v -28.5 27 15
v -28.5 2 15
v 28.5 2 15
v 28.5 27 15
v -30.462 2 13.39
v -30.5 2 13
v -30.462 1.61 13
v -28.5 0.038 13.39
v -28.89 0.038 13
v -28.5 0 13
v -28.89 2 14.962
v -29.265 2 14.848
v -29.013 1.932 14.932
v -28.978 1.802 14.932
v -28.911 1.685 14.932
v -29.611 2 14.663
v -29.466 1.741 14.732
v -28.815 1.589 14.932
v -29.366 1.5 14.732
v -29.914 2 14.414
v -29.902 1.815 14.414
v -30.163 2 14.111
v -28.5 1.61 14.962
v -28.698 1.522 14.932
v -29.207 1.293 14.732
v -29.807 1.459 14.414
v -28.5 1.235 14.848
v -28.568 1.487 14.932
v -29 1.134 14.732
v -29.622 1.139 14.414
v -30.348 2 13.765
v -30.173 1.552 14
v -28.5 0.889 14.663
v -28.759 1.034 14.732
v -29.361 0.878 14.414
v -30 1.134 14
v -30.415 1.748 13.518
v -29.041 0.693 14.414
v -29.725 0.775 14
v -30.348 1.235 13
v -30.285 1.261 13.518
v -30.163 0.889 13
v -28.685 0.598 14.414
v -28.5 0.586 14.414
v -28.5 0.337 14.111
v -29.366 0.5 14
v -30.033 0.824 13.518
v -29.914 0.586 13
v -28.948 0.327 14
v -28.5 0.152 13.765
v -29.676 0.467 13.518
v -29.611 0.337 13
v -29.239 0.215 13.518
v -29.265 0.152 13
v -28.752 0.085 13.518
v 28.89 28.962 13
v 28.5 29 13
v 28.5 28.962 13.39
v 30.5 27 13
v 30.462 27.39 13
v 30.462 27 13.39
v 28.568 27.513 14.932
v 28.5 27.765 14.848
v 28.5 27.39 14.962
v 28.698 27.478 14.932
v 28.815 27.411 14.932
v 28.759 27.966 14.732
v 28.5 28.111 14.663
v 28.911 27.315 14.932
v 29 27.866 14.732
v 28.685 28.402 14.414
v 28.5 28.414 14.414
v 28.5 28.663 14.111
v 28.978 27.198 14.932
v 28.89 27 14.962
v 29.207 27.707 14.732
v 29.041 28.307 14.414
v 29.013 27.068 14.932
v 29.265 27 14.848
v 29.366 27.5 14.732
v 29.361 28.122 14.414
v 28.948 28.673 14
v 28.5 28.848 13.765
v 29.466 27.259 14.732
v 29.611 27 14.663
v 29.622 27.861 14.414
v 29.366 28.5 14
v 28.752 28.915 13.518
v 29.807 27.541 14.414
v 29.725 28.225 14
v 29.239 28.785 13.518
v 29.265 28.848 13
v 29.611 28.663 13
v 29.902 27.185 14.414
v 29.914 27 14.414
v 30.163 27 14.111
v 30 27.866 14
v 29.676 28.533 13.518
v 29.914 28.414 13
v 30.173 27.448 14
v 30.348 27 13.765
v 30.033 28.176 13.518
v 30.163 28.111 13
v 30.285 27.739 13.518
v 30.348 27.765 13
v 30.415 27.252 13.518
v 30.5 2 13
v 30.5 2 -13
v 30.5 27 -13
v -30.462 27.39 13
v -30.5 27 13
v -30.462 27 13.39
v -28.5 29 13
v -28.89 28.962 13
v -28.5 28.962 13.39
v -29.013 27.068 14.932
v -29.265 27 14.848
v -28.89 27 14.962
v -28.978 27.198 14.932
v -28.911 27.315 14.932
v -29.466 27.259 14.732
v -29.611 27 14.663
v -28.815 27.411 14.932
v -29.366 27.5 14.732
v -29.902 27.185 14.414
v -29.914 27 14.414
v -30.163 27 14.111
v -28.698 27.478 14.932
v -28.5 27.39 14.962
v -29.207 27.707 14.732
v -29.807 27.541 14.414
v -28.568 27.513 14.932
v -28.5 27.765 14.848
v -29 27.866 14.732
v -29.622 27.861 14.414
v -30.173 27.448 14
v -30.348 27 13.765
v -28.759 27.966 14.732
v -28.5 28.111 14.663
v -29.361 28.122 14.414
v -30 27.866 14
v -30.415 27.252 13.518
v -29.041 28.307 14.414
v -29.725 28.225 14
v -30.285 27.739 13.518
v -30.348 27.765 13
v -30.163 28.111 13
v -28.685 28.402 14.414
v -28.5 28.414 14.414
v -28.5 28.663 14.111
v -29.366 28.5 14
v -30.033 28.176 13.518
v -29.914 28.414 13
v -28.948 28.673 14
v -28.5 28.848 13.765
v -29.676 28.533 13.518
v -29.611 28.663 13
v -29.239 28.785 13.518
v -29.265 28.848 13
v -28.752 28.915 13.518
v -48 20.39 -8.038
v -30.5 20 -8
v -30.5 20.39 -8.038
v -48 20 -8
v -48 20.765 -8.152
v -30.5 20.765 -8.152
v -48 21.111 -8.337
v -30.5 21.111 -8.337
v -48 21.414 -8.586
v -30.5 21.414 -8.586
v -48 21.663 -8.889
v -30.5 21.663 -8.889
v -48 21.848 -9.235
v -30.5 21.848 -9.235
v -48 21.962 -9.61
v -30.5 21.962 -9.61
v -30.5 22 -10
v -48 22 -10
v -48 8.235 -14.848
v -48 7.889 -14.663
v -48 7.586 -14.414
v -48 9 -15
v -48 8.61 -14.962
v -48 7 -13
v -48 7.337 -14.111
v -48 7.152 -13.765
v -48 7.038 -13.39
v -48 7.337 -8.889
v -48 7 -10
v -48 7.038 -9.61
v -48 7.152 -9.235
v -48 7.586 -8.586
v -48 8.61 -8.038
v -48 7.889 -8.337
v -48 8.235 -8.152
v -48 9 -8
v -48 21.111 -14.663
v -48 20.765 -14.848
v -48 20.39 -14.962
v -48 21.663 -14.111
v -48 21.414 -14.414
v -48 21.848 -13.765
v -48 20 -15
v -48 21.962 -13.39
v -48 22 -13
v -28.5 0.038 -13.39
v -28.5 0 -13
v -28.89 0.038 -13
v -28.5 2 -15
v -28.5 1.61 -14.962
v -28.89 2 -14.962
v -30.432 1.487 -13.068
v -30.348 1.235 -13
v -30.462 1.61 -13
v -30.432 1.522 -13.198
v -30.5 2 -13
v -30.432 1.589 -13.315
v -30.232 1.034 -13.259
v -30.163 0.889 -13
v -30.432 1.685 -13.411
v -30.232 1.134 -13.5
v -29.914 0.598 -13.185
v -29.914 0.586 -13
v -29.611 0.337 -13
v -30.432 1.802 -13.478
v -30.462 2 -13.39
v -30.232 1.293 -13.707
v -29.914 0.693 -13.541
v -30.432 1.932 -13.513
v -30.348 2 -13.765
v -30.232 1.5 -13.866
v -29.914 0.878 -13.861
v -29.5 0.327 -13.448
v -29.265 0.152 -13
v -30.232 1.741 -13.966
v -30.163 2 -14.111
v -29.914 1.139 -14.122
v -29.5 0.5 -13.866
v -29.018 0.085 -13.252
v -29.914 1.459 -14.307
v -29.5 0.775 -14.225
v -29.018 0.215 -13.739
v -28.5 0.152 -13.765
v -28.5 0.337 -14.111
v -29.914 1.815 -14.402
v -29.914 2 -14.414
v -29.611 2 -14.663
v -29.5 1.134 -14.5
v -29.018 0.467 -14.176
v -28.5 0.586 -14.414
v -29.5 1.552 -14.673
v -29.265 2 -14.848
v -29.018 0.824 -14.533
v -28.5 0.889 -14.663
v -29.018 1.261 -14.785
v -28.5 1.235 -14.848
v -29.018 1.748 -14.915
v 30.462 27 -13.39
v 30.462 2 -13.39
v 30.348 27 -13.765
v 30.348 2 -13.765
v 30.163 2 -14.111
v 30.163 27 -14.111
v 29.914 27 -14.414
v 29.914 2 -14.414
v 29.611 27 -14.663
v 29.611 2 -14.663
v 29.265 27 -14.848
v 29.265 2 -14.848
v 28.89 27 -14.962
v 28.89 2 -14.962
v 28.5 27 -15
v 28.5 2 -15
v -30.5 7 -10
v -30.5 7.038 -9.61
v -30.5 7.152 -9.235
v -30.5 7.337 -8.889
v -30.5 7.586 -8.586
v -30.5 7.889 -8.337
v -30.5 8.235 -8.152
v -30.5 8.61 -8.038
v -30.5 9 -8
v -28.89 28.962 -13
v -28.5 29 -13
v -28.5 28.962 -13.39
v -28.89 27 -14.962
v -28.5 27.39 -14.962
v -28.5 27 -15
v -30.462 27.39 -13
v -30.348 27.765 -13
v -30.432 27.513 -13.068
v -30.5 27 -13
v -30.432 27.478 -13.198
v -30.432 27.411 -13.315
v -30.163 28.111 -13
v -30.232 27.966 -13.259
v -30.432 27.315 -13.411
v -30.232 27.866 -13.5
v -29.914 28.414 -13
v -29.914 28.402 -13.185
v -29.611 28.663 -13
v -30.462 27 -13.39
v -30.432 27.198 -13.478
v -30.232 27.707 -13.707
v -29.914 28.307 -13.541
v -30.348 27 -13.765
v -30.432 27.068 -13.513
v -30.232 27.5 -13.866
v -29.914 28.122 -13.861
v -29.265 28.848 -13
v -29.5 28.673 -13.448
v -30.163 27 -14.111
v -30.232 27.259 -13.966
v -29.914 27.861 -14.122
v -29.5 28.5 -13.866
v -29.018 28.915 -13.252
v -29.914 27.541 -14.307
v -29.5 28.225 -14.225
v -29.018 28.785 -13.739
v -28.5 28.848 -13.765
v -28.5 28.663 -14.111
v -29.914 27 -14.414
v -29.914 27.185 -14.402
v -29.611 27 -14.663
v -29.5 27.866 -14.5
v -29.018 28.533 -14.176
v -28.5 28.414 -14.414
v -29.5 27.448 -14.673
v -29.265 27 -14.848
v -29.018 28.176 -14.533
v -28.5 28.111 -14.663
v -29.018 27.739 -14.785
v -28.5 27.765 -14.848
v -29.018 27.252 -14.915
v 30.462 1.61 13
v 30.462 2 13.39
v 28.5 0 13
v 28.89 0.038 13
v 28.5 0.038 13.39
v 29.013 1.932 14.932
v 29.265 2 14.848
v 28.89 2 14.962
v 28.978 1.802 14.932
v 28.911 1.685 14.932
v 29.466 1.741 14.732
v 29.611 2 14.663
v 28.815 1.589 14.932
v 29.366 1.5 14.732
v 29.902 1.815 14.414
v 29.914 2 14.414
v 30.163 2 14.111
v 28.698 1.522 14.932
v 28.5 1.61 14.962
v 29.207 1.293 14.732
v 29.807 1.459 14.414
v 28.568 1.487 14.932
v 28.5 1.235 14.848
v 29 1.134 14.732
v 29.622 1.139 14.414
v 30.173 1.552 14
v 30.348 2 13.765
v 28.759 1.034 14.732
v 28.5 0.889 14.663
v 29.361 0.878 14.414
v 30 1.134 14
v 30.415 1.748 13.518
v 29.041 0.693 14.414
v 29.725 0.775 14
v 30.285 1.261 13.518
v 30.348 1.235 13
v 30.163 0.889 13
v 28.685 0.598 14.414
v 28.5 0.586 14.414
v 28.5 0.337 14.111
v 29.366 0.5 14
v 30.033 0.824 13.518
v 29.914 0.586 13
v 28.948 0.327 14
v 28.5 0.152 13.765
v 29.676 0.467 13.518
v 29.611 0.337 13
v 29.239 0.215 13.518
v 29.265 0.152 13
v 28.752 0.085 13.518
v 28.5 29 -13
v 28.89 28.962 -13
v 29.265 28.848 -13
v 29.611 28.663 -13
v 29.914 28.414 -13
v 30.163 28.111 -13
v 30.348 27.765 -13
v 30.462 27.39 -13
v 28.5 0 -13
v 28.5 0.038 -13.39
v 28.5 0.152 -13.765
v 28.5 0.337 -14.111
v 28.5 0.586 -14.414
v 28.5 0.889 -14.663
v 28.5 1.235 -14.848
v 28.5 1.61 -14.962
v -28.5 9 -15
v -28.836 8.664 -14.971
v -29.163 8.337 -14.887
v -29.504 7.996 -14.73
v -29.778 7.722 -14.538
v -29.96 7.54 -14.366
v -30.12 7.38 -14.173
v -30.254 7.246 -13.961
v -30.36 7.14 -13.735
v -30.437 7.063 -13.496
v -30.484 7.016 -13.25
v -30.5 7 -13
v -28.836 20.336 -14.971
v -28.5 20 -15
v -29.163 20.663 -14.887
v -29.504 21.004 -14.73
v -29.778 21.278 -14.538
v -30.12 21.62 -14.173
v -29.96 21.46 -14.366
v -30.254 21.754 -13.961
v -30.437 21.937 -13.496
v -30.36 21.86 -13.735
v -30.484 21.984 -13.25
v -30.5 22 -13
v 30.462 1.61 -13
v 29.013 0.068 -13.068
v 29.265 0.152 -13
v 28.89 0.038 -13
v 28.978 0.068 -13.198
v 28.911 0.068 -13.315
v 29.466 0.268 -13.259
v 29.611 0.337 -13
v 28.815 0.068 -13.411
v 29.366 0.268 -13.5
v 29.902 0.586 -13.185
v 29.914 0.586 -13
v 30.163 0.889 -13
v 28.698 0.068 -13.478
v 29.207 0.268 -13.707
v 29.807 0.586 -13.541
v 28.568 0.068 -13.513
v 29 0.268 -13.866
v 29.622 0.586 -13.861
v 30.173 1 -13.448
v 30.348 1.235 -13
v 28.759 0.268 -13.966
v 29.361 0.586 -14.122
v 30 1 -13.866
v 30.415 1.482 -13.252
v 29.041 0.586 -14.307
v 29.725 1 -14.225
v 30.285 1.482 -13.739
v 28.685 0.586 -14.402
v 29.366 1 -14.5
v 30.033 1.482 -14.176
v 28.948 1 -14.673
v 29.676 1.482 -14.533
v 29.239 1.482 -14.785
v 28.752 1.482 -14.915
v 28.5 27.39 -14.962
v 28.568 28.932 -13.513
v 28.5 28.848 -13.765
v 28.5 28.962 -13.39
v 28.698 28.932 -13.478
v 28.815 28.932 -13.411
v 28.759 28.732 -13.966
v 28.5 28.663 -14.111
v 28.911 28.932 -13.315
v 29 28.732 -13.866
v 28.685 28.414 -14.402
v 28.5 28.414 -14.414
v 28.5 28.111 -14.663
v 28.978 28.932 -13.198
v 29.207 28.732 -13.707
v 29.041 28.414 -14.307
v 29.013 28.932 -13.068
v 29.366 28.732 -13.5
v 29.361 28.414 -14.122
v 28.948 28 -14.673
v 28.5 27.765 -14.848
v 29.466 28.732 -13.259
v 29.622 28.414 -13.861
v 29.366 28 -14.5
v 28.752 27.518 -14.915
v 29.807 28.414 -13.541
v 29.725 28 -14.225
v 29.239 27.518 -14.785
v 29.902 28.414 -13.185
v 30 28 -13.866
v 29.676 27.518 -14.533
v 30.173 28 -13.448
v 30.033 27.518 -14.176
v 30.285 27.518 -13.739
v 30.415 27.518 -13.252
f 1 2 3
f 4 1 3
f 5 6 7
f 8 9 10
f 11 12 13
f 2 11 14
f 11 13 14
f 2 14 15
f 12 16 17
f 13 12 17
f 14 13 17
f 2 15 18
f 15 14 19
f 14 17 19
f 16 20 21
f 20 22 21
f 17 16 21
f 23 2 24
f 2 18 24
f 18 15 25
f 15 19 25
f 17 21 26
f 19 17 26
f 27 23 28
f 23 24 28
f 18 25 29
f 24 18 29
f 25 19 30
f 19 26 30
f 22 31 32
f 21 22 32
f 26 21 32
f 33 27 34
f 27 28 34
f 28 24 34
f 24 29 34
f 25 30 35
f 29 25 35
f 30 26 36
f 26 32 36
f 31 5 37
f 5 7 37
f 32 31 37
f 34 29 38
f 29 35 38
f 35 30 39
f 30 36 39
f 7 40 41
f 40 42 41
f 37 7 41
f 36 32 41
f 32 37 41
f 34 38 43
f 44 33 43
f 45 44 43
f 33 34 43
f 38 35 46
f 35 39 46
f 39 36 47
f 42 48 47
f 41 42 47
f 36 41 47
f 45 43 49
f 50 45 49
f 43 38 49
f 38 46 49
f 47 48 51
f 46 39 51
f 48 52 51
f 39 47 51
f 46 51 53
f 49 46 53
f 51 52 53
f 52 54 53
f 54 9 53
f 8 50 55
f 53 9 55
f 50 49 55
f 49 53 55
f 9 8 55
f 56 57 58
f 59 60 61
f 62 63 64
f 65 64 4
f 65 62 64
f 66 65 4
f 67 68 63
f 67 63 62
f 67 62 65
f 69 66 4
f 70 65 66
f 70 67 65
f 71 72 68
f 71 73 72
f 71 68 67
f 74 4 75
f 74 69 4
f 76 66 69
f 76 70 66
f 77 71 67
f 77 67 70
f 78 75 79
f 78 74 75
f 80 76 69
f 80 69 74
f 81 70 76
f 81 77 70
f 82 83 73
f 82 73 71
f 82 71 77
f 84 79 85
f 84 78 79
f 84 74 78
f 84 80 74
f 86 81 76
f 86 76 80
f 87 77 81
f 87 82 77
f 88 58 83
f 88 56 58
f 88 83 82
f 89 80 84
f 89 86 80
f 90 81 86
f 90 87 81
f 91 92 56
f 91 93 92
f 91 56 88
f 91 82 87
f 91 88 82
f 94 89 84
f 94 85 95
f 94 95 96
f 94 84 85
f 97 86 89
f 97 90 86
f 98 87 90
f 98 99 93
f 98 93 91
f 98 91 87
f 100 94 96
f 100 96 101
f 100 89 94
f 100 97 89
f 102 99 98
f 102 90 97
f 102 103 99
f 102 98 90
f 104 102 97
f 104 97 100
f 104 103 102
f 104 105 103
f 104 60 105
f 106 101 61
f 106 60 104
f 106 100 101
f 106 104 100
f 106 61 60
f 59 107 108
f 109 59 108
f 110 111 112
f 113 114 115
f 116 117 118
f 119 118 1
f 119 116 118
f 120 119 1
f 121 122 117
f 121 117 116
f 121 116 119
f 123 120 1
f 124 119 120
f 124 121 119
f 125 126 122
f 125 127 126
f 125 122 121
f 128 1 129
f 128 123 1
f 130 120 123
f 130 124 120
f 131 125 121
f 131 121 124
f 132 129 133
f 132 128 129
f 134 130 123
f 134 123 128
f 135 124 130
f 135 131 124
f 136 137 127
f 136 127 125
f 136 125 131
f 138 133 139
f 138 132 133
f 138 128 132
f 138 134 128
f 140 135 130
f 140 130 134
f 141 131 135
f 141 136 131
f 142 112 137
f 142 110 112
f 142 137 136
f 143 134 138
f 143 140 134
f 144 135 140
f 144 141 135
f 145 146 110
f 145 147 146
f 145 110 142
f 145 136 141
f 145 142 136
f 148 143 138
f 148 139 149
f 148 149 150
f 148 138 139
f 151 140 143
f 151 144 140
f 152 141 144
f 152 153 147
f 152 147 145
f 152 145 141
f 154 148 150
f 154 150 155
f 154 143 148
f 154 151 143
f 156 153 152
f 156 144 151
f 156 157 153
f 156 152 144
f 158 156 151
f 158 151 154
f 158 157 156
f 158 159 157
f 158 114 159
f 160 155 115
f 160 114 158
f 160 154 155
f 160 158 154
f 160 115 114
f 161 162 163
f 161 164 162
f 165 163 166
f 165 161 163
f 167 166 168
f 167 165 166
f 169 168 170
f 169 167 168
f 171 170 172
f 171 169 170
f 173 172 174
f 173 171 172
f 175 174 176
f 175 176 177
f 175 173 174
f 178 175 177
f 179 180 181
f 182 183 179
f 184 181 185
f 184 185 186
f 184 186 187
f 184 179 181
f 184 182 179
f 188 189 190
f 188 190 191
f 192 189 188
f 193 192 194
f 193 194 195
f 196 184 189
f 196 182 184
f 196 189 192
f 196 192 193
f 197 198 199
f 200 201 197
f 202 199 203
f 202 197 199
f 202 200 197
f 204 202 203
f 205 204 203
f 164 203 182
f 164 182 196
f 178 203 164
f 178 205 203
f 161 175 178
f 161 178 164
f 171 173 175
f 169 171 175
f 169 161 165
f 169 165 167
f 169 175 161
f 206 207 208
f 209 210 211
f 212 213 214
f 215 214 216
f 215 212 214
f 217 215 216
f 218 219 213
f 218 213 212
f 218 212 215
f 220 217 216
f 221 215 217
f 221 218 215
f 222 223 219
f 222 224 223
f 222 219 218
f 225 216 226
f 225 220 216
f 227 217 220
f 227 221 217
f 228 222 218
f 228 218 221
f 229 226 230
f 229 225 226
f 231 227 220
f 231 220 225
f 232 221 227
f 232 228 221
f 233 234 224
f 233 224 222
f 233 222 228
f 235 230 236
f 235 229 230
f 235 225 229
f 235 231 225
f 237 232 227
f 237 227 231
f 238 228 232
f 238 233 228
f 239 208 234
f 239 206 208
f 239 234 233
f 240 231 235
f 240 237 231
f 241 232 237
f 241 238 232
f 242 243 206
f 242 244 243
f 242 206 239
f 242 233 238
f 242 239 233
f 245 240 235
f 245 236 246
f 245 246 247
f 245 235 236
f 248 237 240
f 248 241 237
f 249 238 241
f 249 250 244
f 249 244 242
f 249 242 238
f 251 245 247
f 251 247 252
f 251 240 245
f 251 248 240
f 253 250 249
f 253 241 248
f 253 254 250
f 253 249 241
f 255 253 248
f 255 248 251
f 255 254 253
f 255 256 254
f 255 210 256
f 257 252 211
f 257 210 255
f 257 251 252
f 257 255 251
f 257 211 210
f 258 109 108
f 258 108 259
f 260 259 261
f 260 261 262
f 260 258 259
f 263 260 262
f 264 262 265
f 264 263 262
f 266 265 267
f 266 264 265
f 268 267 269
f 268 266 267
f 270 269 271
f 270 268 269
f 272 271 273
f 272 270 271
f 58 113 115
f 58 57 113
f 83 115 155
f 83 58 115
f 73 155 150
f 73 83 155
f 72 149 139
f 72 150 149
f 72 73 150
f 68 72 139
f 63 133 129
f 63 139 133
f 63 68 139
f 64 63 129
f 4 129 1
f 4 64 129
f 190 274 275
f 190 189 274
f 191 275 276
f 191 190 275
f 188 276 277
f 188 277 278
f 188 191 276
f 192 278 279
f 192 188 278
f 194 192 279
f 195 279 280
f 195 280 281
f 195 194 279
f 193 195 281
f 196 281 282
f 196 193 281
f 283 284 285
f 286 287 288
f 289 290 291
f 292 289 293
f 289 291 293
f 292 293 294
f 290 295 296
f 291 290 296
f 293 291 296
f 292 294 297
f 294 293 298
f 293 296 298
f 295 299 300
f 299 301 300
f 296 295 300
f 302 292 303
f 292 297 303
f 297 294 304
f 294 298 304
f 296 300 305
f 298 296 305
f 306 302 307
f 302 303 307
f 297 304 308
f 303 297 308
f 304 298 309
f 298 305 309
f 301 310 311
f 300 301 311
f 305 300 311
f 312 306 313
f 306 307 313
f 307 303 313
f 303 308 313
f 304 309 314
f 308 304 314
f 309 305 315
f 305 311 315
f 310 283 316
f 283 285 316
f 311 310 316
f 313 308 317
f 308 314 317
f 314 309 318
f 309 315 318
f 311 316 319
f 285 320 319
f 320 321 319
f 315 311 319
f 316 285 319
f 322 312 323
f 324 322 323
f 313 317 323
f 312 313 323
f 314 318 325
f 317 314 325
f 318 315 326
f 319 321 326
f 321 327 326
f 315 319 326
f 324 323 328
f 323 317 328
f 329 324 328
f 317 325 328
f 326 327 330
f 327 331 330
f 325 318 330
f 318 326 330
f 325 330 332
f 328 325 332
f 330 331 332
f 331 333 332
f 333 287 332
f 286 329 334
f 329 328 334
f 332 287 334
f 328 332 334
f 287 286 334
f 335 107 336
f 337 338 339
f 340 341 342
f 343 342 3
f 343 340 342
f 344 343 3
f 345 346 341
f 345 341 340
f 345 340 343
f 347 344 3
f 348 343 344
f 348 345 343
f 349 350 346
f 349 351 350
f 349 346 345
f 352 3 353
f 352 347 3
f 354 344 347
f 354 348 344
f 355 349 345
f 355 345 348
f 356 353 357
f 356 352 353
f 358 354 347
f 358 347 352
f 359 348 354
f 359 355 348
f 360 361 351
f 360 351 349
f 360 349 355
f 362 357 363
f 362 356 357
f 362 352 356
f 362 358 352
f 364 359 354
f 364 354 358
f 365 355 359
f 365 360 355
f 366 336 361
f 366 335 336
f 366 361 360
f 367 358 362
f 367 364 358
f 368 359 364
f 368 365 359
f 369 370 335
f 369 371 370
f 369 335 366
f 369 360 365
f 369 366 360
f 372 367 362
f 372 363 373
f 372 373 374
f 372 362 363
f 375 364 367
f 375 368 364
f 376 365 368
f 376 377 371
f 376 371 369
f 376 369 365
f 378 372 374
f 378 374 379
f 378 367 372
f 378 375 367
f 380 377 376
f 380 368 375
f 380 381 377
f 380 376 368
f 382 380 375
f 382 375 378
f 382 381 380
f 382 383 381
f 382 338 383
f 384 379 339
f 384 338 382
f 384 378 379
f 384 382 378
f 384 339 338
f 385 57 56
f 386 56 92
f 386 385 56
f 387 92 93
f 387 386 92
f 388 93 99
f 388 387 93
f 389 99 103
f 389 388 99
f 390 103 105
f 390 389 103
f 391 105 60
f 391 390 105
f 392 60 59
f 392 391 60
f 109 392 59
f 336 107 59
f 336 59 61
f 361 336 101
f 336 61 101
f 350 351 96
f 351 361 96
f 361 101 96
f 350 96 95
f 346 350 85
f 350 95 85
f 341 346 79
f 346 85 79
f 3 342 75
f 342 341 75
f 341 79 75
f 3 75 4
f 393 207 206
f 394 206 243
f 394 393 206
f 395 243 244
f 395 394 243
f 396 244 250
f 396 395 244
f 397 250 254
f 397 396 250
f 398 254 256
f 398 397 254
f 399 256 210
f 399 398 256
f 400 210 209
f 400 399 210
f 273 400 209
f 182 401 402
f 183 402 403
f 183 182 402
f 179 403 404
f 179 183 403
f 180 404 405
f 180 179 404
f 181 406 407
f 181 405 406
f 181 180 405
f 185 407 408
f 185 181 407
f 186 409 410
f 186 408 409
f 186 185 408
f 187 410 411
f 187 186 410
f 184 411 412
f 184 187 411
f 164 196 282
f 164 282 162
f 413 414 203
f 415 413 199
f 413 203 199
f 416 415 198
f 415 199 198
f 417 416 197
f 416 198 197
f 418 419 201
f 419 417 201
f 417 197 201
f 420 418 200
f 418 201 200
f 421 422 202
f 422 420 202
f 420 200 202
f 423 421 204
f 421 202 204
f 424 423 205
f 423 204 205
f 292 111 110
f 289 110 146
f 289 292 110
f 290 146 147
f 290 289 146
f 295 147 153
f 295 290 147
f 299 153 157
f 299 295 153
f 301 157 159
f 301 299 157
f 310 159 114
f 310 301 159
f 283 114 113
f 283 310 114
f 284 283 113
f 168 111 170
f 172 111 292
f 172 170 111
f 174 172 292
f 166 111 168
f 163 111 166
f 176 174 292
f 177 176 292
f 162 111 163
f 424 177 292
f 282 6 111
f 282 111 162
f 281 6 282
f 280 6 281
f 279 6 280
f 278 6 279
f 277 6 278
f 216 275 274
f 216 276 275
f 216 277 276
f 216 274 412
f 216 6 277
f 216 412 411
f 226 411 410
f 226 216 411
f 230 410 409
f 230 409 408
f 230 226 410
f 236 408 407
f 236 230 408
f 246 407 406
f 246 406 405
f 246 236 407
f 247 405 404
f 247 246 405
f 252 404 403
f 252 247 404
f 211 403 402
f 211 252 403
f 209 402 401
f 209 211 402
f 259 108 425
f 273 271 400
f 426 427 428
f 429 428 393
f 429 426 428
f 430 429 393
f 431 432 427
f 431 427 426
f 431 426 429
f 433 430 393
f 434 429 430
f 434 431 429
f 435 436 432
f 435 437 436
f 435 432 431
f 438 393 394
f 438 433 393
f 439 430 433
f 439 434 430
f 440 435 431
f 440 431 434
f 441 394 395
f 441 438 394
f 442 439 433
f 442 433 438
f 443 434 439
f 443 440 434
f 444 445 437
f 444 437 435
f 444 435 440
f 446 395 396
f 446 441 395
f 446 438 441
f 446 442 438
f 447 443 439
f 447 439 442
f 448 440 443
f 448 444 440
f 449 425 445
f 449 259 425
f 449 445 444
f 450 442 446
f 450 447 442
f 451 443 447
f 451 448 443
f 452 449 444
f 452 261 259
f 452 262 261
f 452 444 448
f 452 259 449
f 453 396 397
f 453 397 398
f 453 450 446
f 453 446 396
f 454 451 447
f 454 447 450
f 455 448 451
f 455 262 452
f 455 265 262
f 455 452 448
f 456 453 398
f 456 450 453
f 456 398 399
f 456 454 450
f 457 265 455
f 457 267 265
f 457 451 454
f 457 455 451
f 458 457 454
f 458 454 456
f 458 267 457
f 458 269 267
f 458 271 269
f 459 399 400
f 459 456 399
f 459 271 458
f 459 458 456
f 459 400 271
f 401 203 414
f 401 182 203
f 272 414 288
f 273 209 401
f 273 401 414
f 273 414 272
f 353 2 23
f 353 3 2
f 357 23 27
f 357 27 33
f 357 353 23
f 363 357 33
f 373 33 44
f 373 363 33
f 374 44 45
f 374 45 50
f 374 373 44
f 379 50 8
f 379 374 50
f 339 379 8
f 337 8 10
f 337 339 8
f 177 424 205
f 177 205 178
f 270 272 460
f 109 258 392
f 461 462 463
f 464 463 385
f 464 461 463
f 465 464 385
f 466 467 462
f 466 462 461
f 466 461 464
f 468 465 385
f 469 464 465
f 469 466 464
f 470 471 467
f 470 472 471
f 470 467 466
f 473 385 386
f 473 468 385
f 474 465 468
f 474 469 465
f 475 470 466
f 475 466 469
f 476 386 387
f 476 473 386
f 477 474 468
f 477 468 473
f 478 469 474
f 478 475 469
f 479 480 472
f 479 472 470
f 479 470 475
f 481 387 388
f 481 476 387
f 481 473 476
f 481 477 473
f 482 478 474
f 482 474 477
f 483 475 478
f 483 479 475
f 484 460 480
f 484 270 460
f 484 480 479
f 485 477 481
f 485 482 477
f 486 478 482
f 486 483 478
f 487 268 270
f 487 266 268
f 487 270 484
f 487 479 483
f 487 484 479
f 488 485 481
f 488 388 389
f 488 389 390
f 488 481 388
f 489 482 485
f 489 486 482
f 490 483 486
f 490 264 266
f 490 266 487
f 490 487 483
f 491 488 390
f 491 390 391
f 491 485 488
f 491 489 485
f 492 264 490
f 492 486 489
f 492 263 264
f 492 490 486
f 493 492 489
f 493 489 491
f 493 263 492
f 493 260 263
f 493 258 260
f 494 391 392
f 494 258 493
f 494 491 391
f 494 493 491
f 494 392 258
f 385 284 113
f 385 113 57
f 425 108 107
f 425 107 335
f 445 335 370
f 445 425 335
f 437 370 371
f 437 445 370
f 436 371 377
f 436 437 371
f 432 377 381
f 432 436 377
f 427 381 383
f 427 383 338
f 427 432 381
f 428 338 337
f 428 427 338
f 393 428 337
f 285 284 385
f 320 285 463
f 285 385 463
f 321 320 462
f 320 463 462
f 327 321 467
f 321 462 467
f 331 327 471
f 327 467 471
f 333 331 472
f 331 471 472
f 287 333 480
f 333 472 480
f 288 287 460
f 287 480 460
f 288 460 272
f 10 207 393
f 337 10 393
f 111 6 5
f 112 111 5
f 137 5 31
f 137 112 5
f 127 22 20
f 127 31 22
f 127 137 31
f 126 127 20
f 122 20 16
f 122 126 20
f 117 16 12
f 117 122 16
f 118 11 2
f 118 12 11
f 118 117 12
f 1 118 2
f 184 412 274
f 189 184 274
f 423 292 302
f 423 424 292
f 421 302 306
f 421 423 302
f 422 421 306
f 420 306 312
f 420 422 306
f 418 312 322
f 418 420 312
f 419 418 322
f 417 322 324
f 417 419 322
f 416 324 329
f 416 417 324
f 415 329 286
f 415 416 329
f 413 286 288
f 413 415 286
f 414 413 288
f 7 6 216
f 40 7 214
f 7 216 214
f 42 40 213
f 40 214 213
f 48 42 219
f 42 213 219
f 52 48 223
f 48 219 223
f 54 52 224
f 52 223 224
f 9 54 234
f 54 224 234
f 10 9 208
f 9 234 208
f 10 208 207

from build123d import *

# Parameters (mm, degrees)
SKETCH1_W           = 61
SKETCH1_H           = 30
BOSS_EXTRUDE1_DEPTH = 29
SKETCH2_W           = 7
SKETCH2_H           = 15
BOSS_EXTRUDE2_DEPTH = 17.5
FILLET1_R           = 2
FILLET2_R           = 2


with BuildPart() as part:
    # Sketch1 → Boss-Extrude1 (new body)
    with BuildSketch(Plane(origin=(0, 0, 0), x_dir=(1, 0, 0), z_dir=(0, 1, 0))):
        Rectangle(SKETCH1_W, SKETCH1_H)
    extrude(amount=BOSS_EXTRUDE1_DEPTH)

    # Sketch2 → Boss-Extrude2 (add)
    with BuildSketch(Plane.ZY.offset(30.5)):
        with Locations((-11.5, 14.5)):
            Rectangle(SKETCH2_W, SKETCH2_H)
    extrude(amount=BOSS_EXTRUDE2_DEPTH)

    # Fillet1
    fillet1_edges = [part.edges().sort_by_distance(p)[0] for p in [
        (-39.25, 22, -15),
        (-39.25, 7, -15),
        (-39.25, 7, -8),
        (-39.25, 22, -8),
    ]]
    fillet(fillet1_edges, radius=FILLET1_R)

    # Fillet2
    fillet2_edges = [part.edges().sort_by_distance(p)[0] for p in [
        (30.5, 14.5, -15),
        (0, 29, -15),
        (30.5, 29, 0),
        (-30.5, 29, 0),
        (30.5, 0, 0),
        (0, 0, -15),
        (-30.5, 0, 0),
        (-30.5, 14.5, 15),
        (0, 29, 15),
        (30.5, 14.5, 15),
        (0, 0, 15),
        (-30.5, 25.5, -15),
        (-30.5, 3.5, -15),
    ]]
    fillet(fillet2_edges, radius=FILLET2_R)


solid = part.part
